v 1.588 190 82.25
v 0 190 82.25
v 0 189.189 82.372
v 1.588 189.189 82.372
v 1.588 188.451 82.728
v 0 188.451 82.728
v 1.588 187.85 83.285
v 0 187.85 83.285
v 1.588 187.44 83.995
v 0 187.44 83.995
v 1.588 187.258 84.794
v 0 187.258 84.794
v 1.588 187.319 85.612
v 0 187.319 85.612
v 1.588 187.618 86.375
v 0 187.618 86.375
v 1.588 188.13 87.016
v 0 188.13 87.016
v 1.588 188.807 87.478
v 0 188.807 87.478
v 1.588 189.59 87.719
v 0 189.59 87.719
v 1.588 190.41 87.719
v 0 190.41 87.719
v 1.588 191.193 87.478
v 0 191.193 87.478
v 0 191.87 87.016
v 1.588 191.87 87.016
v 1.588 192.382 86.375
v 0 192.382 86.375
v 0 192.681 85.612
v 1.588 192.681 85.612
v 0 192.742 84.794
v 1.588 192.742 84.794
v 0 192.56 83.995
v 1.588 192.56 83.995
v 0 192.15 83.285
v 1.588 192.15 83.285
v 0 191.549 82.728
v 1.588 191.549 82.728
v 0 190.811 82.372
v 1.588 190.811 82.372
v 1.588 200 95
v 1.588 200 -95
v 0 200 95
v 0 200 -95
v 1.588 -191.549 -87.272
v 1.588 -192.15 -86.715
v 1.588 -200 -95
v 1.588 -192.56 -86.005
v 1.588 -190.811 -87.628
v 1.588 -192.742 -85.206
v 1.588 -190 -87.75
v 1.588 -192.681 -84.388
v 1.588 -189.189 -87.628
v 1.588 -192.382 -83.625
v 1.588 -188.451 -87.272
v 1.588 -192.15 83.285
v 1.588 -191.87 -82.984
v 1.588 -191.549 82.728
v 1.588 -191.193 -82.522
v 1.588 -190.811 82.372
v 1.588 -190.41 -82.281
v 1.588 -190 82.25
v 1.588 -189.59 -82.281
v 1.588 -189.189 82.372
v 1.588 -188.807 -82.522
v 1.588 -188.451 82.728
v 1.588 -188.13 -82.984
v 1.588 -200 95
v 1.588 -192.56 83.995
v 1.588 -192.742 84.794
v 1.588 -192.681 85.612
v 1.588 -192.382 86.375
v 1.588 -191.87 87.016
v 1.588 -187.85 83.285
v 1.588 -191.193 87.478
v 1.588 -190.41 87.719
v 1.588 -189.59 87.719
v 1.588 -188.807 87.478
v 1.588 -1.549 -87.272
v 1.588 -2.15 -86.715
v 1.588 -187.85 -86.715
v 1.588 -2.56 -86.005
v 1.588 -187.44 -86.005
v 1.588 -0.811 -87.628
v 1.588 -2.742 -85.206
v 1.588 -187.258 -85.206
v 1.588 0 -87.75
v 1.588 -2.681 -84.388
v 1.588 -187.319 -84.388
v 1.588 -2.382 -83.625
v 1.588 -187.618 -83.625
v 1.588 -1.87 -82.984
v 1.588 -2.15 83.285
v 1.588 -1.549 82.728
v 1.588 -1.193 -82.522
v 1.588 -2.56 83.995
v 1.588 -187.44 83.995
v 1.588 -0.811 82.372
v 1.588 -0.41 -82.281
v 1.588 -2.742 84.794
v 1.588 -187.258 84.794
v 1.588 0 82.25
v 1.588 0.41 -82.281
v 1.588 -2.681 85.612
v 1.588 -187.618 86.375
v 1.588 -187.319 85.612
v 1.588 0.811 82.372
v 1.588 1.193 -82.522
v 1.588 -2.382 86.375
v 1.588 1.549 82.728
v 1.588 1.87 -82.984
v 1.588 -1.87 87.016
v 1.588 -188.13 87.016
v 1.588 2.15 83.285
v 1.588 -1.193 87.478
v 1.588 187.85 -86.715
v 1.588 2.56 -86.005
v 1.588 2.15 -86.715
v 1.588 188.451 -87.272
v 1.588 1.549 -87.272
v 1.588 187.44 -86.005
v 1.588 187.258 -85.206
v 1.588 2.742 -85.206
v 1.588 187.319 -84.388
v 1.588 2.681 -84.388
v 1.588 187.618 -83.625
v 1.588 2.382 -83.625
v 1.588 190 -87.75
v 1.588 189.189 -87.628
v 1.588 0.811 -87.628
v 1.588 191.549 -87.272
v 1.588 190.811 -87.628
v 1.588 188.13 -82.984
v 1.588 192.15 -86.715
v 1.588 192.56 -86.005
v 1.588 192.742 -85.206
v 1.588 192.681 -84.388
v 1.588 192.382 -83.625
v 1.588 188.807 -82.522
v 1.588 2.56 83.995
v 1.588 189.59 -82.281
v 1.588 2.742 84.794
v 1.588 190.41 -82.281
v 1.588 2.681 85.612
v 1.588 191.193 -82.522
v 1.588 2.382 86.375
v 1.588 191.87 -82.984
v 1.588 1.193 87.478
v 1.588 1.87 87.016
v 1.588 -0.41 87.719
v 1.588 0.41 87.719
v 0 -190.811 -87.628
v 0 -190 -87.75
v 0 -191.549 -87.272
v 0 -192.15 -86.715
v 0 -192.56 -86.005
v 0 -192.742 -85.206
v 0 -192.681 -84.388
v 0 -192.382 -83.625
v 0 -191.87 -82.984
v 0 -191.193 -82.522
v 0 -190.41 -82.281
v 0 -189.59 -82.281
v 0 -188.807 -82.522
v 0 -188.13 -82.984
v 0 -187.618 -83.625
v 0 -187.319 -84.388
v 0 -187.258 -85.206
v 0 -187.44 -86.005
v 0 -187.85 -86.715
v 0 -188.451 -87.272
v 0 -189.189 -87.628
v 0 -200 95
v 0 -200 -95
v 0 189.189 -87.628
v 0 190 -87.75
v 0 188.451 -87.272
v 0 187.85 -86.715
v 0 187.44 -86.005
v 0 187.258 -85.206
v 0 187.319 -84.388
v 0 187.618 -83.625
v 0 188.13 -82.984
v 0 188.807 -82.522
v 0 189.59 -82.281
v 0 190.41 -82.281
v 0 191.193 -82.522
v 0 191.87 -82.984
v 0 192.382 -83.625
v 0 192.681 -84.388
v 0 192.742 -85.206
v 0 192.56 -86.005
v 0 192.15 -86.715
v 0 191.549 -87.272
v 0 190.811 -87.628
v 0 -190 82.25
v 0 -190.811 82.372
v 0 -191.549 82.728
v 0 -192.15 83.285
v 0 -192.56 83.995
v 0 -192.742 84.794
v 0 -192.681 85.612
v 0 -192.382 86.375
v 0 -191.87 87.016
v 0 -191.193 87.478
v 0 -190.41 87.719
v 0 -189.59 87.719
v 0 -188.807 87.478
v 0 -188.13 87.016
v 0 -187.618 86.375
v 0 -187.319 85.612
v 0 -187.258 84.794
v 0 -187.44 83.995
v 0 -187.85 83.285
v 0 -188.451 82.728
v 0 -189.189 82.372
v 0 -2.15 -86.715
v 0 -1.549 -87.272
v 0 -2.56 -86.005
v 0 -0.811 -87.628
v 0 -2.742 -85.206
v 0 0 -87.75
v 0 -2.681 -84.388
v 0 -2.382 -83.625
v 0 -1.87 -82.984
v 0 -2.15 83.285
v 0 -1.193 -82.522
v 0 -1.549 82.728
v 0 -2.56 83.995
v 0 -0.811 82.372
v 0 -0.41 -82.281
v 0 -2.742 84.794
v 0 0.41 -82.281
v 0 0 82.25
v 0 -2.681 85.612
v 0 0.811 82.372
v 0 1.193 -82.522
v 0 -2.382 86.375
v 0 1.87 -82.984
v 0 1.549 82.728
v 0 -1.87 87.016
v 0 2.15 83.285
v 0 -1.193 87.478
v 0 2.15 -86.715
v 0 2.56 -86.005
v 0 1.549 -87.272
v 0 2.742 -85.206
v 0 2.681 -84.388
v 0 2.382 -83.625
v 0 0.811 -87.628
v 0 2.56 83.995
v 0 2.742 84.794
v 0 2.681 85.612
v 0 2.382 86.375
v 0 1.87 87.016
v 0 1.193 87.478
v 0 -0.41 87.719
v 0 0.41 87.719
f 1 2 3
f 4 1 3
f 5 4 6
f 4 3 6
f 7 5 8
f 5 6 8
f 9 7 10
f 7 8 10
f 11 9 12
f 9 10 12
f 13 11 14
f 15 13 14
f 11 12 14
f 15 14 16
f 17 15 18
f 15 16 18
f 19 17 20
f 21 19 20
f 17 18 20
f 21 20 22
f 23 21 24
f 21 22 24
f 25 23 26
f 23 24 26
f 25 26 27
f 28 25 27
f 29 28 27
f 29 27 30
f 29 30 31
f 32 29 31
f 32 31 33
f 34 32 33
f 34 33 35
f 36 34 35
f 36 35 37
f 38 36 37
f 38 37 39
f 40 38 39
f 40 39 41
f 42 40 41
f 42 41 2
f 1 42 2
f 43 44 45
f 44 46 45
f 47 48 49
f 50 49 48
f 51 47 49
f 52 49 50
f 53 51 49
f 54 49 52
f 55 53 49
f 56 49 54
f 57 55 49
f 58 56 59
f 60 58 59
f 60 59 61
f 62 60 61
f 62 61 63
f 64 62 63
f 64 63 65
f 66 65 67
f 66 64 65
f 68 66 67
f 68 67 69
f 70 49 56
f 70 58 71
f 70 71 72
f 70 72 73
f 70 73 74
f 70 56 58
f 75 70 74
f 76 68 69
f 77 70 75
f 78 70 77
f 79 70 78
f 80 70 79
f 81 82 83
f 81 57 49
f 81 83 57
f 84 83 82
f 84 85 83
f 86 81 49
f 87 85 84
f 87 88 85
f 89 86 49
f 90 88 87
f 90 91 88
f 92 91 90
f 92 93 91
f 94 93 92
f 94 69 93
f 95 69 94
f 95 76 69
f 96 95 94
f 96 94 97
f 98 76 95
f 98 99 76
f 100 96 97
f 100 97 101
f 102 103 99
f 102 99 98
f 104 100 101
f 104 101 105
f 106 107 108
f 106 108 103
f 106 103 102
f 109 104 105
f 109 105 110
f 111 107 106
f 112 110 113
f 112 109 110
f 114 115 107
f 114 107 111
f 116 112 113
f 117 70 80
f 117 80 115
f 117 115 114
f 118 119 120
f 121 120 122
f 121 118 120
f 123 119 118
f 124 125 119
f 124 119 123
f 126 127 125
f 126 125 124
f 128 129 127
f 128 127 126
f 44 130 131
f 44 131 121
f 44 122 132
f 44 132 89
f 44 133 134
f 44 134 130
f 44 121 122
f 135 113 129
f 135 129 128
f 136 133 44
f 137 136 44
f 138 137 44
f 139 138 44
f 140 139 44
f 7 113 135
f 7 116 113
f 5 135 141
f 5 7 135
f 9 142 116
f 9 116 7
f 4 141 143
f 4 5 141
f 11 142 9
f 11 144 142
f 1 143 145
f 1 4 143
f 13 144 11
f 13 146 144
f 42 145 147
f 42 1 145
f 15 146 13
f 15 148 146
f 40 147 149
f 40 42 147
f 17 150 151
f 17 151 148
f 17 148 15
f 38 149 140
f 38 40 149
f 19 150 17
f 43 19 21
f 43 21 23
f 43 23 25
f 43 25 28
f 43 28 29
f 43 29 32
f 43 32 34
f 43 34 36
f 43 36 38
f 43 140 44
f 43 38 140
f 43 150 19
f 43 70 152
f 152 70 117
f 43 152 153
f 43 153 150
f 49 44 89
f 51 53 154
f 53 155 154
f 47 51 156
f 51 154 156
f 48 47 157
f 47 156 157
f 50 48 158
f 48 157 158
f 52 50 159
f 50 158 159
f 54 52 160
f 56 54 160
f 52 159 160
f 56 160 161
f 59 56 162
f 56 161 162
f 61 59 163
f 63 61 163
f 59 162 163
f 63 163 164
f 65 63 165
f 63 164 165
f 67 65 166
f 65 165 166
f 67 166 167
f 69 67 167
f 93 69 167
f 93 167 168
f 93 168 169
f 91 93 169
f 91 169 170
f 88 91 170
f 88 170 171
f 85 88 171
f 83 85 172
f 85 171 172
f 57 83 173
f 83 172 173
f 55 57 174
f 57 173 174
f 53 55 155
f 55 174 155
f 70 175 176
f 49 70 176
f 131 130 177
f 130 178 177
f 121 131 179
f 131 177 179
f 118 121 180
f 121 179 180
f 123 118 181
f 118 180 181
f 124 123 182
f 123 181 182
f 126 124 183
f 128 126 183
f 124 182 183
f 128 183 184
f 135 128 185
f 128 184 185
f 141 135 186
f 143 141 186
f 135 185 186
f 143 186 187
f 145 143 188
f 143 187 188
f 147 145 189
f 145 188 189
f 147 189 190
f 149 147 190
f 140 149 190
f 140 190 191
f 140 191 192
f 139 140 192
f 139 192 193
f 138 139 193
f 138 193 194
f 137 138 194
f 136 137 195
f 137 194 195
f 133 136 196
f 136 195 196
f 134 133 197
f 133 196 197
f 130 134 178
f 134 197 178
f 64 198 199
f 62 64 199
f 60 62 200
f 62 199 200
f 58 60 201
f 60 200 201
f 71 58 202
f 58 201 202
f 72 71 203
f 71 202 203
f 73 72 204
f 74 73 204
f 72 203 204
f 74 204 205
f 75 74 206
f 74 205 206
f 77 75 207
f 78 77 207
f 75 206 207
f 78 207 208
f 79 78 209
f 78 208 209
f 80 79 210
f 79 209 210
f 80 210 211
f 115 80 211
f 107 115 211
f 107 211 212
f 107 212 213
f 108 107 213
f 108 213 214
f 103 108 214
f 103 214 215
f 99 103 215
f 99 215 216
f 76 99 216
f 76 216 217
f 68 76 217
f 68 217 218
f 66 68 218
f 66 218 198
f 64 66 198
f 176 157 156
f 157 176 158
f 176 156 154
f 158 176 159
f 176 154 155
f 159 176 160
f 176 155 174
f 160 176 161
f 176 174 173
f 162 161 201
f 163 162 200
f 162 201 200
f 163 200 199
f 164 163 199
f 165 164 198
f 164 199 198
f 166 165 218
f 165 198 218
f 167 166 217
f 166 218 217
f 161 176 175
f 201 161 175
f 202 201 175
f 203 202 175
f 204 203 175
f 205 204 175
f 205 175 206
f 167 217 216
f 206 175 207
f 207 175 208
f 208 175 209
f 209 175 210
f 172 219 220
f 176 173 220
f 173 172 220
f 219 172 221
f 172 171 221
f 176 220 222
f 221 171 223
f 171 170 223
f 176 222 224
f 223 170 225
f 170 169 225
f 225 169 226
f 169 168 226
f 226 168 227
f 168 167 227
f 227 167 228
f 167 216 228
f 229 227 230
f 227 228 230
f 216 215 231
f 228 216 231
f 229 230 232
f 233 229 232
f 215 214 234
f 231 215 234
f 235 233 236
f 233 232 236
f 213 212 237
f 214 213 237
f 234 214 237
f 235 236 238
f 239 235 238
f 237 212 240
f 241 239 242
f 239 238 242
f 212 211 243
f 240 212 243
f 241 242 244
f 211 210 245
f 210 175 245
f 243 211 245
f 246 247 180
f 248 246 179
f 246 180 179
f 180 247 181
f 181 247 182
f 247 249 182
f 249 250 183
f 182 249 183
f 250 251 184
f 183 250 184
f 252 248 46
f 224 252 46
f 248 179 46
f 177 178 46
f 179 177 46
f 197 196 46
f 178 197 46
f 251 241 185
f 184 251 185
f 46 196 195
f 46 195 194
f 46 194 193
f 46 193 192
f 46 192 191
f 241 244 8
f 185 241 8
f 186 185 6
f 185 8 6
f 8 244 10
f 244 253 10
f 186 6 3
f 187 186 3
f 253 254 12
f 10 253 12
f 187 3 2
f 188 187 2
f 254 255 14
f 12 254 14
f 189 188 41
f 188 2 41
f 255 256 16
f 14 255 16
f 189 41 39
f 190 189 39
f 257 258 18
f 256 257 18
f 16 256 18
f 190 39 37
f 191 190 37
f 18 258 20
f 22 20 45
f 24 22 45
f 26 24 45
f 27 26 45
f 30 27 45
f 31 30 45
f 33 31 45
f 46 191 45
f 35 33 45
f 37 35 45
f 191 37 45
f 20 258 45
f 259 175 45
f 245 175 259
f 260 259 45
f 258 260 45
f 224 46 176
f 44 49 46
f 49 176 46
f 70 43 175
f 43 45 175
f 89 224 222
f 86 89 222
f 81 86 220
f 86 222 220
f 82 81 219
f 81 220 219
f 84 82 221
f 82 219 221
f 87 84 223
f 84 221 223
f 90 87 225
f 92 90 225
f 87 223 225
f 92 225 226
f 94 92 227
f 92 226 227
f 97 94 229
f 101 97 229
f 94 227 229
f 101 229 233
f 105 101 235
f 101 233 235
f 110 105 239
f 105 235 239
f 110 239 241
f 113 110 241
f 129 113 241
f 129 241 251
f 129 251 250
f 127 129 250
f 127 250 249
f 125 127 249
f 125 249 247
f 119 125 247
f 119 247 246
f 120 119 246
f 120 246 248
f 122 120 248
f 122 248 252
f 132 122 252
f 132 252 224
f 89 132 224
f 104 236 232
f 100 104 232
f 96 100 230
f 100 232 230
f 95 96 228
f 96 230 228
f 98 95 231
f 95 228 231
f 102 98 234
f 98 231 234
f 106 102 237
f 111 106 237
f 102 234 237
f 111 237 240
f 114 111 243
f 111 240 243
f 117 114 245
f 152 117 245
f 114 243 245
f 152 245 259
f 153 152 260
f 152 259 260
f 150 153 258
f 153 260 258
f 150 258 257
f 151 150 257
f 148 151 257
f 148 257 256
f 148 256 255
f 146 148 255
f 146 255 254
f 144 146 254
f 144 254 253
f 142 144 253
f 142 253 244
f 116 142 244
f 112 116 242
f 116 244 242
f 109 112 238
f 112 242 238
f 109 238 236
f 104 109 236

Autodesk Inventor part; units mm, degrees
ref_plane "YZ Plane" through (0, 0, 0) normal (1, 0, 0) x (0, 1, 0)
ref_plane "XZ Plane" through (0, 0, 0) normal (0, 1, 0) x (-1, 0, 0)
ref_plane "XY Plane" through (0, 0, 0) normal (0, 0, 1) x (1, 0, 0)
sketch "Sketch1" plane through (0, 0, 0) normal (1, 0, 0) x (0, 1, 0)
  line L0 (200, 95) -> (-200, 95)
  line L1 (-200, 95) -> (-200, -95)
  line L2 (-200, -95) -> (200, -95)
  line L3 (200, -95) -> (200, 95)
  line L4 (200, 95) -> (-200, -95) construction
  line L5 (-200, 95) -> (200, -95) construction
  point P0 (0, 0)
  dimension "d0" = 400
  dimension "d1" = 190
extrude "Extrusion1" add sketch "Sketch1" along normal blind 1.5875
sketch "Sketch2" plane through (1.5875, 0, 0) normal (1, 0, 0) x (0, 0, -1)
  circle A0 centre (-85, 190) radius 5
  circle A1 centre (85, 190) radius 5
  circle A2 centre (85, -190) radius 5
  circle A3 centre (-85, -190) radius 5
  line L0 (95, 200) -> (-95, 200) projected
  line L1 (-95, 200) -> (-95, -200) projected
  line L2 (-95, -200) -> (95, -200) projected
  line L3 (95, -200) -> (95, 200) projected
  point P0 (0, 0)
  point P1 (-85, 0)
  point P2 (85, 0)
  dimension "d4" = 10
  dimension "d5" = 10
  dimension "d6" = 10
  dimension "d7" = 10
  dimension "d8" = 10
hole "Hole1" at (1.5875, 190, 85) at (1.5875, 190, -85) at (1.5875, -190, -85) at (1.5875, -190, 85) at (1.5875, 0, 85) at (1.5875, 0, -85) direction (-1, 0, 0) diameter 5.5 end through all clearance for "Flat Head Machine Screw" size "M5" standard "Ansi Metric M Profile"
properties part number "long covering" material "Glass"
